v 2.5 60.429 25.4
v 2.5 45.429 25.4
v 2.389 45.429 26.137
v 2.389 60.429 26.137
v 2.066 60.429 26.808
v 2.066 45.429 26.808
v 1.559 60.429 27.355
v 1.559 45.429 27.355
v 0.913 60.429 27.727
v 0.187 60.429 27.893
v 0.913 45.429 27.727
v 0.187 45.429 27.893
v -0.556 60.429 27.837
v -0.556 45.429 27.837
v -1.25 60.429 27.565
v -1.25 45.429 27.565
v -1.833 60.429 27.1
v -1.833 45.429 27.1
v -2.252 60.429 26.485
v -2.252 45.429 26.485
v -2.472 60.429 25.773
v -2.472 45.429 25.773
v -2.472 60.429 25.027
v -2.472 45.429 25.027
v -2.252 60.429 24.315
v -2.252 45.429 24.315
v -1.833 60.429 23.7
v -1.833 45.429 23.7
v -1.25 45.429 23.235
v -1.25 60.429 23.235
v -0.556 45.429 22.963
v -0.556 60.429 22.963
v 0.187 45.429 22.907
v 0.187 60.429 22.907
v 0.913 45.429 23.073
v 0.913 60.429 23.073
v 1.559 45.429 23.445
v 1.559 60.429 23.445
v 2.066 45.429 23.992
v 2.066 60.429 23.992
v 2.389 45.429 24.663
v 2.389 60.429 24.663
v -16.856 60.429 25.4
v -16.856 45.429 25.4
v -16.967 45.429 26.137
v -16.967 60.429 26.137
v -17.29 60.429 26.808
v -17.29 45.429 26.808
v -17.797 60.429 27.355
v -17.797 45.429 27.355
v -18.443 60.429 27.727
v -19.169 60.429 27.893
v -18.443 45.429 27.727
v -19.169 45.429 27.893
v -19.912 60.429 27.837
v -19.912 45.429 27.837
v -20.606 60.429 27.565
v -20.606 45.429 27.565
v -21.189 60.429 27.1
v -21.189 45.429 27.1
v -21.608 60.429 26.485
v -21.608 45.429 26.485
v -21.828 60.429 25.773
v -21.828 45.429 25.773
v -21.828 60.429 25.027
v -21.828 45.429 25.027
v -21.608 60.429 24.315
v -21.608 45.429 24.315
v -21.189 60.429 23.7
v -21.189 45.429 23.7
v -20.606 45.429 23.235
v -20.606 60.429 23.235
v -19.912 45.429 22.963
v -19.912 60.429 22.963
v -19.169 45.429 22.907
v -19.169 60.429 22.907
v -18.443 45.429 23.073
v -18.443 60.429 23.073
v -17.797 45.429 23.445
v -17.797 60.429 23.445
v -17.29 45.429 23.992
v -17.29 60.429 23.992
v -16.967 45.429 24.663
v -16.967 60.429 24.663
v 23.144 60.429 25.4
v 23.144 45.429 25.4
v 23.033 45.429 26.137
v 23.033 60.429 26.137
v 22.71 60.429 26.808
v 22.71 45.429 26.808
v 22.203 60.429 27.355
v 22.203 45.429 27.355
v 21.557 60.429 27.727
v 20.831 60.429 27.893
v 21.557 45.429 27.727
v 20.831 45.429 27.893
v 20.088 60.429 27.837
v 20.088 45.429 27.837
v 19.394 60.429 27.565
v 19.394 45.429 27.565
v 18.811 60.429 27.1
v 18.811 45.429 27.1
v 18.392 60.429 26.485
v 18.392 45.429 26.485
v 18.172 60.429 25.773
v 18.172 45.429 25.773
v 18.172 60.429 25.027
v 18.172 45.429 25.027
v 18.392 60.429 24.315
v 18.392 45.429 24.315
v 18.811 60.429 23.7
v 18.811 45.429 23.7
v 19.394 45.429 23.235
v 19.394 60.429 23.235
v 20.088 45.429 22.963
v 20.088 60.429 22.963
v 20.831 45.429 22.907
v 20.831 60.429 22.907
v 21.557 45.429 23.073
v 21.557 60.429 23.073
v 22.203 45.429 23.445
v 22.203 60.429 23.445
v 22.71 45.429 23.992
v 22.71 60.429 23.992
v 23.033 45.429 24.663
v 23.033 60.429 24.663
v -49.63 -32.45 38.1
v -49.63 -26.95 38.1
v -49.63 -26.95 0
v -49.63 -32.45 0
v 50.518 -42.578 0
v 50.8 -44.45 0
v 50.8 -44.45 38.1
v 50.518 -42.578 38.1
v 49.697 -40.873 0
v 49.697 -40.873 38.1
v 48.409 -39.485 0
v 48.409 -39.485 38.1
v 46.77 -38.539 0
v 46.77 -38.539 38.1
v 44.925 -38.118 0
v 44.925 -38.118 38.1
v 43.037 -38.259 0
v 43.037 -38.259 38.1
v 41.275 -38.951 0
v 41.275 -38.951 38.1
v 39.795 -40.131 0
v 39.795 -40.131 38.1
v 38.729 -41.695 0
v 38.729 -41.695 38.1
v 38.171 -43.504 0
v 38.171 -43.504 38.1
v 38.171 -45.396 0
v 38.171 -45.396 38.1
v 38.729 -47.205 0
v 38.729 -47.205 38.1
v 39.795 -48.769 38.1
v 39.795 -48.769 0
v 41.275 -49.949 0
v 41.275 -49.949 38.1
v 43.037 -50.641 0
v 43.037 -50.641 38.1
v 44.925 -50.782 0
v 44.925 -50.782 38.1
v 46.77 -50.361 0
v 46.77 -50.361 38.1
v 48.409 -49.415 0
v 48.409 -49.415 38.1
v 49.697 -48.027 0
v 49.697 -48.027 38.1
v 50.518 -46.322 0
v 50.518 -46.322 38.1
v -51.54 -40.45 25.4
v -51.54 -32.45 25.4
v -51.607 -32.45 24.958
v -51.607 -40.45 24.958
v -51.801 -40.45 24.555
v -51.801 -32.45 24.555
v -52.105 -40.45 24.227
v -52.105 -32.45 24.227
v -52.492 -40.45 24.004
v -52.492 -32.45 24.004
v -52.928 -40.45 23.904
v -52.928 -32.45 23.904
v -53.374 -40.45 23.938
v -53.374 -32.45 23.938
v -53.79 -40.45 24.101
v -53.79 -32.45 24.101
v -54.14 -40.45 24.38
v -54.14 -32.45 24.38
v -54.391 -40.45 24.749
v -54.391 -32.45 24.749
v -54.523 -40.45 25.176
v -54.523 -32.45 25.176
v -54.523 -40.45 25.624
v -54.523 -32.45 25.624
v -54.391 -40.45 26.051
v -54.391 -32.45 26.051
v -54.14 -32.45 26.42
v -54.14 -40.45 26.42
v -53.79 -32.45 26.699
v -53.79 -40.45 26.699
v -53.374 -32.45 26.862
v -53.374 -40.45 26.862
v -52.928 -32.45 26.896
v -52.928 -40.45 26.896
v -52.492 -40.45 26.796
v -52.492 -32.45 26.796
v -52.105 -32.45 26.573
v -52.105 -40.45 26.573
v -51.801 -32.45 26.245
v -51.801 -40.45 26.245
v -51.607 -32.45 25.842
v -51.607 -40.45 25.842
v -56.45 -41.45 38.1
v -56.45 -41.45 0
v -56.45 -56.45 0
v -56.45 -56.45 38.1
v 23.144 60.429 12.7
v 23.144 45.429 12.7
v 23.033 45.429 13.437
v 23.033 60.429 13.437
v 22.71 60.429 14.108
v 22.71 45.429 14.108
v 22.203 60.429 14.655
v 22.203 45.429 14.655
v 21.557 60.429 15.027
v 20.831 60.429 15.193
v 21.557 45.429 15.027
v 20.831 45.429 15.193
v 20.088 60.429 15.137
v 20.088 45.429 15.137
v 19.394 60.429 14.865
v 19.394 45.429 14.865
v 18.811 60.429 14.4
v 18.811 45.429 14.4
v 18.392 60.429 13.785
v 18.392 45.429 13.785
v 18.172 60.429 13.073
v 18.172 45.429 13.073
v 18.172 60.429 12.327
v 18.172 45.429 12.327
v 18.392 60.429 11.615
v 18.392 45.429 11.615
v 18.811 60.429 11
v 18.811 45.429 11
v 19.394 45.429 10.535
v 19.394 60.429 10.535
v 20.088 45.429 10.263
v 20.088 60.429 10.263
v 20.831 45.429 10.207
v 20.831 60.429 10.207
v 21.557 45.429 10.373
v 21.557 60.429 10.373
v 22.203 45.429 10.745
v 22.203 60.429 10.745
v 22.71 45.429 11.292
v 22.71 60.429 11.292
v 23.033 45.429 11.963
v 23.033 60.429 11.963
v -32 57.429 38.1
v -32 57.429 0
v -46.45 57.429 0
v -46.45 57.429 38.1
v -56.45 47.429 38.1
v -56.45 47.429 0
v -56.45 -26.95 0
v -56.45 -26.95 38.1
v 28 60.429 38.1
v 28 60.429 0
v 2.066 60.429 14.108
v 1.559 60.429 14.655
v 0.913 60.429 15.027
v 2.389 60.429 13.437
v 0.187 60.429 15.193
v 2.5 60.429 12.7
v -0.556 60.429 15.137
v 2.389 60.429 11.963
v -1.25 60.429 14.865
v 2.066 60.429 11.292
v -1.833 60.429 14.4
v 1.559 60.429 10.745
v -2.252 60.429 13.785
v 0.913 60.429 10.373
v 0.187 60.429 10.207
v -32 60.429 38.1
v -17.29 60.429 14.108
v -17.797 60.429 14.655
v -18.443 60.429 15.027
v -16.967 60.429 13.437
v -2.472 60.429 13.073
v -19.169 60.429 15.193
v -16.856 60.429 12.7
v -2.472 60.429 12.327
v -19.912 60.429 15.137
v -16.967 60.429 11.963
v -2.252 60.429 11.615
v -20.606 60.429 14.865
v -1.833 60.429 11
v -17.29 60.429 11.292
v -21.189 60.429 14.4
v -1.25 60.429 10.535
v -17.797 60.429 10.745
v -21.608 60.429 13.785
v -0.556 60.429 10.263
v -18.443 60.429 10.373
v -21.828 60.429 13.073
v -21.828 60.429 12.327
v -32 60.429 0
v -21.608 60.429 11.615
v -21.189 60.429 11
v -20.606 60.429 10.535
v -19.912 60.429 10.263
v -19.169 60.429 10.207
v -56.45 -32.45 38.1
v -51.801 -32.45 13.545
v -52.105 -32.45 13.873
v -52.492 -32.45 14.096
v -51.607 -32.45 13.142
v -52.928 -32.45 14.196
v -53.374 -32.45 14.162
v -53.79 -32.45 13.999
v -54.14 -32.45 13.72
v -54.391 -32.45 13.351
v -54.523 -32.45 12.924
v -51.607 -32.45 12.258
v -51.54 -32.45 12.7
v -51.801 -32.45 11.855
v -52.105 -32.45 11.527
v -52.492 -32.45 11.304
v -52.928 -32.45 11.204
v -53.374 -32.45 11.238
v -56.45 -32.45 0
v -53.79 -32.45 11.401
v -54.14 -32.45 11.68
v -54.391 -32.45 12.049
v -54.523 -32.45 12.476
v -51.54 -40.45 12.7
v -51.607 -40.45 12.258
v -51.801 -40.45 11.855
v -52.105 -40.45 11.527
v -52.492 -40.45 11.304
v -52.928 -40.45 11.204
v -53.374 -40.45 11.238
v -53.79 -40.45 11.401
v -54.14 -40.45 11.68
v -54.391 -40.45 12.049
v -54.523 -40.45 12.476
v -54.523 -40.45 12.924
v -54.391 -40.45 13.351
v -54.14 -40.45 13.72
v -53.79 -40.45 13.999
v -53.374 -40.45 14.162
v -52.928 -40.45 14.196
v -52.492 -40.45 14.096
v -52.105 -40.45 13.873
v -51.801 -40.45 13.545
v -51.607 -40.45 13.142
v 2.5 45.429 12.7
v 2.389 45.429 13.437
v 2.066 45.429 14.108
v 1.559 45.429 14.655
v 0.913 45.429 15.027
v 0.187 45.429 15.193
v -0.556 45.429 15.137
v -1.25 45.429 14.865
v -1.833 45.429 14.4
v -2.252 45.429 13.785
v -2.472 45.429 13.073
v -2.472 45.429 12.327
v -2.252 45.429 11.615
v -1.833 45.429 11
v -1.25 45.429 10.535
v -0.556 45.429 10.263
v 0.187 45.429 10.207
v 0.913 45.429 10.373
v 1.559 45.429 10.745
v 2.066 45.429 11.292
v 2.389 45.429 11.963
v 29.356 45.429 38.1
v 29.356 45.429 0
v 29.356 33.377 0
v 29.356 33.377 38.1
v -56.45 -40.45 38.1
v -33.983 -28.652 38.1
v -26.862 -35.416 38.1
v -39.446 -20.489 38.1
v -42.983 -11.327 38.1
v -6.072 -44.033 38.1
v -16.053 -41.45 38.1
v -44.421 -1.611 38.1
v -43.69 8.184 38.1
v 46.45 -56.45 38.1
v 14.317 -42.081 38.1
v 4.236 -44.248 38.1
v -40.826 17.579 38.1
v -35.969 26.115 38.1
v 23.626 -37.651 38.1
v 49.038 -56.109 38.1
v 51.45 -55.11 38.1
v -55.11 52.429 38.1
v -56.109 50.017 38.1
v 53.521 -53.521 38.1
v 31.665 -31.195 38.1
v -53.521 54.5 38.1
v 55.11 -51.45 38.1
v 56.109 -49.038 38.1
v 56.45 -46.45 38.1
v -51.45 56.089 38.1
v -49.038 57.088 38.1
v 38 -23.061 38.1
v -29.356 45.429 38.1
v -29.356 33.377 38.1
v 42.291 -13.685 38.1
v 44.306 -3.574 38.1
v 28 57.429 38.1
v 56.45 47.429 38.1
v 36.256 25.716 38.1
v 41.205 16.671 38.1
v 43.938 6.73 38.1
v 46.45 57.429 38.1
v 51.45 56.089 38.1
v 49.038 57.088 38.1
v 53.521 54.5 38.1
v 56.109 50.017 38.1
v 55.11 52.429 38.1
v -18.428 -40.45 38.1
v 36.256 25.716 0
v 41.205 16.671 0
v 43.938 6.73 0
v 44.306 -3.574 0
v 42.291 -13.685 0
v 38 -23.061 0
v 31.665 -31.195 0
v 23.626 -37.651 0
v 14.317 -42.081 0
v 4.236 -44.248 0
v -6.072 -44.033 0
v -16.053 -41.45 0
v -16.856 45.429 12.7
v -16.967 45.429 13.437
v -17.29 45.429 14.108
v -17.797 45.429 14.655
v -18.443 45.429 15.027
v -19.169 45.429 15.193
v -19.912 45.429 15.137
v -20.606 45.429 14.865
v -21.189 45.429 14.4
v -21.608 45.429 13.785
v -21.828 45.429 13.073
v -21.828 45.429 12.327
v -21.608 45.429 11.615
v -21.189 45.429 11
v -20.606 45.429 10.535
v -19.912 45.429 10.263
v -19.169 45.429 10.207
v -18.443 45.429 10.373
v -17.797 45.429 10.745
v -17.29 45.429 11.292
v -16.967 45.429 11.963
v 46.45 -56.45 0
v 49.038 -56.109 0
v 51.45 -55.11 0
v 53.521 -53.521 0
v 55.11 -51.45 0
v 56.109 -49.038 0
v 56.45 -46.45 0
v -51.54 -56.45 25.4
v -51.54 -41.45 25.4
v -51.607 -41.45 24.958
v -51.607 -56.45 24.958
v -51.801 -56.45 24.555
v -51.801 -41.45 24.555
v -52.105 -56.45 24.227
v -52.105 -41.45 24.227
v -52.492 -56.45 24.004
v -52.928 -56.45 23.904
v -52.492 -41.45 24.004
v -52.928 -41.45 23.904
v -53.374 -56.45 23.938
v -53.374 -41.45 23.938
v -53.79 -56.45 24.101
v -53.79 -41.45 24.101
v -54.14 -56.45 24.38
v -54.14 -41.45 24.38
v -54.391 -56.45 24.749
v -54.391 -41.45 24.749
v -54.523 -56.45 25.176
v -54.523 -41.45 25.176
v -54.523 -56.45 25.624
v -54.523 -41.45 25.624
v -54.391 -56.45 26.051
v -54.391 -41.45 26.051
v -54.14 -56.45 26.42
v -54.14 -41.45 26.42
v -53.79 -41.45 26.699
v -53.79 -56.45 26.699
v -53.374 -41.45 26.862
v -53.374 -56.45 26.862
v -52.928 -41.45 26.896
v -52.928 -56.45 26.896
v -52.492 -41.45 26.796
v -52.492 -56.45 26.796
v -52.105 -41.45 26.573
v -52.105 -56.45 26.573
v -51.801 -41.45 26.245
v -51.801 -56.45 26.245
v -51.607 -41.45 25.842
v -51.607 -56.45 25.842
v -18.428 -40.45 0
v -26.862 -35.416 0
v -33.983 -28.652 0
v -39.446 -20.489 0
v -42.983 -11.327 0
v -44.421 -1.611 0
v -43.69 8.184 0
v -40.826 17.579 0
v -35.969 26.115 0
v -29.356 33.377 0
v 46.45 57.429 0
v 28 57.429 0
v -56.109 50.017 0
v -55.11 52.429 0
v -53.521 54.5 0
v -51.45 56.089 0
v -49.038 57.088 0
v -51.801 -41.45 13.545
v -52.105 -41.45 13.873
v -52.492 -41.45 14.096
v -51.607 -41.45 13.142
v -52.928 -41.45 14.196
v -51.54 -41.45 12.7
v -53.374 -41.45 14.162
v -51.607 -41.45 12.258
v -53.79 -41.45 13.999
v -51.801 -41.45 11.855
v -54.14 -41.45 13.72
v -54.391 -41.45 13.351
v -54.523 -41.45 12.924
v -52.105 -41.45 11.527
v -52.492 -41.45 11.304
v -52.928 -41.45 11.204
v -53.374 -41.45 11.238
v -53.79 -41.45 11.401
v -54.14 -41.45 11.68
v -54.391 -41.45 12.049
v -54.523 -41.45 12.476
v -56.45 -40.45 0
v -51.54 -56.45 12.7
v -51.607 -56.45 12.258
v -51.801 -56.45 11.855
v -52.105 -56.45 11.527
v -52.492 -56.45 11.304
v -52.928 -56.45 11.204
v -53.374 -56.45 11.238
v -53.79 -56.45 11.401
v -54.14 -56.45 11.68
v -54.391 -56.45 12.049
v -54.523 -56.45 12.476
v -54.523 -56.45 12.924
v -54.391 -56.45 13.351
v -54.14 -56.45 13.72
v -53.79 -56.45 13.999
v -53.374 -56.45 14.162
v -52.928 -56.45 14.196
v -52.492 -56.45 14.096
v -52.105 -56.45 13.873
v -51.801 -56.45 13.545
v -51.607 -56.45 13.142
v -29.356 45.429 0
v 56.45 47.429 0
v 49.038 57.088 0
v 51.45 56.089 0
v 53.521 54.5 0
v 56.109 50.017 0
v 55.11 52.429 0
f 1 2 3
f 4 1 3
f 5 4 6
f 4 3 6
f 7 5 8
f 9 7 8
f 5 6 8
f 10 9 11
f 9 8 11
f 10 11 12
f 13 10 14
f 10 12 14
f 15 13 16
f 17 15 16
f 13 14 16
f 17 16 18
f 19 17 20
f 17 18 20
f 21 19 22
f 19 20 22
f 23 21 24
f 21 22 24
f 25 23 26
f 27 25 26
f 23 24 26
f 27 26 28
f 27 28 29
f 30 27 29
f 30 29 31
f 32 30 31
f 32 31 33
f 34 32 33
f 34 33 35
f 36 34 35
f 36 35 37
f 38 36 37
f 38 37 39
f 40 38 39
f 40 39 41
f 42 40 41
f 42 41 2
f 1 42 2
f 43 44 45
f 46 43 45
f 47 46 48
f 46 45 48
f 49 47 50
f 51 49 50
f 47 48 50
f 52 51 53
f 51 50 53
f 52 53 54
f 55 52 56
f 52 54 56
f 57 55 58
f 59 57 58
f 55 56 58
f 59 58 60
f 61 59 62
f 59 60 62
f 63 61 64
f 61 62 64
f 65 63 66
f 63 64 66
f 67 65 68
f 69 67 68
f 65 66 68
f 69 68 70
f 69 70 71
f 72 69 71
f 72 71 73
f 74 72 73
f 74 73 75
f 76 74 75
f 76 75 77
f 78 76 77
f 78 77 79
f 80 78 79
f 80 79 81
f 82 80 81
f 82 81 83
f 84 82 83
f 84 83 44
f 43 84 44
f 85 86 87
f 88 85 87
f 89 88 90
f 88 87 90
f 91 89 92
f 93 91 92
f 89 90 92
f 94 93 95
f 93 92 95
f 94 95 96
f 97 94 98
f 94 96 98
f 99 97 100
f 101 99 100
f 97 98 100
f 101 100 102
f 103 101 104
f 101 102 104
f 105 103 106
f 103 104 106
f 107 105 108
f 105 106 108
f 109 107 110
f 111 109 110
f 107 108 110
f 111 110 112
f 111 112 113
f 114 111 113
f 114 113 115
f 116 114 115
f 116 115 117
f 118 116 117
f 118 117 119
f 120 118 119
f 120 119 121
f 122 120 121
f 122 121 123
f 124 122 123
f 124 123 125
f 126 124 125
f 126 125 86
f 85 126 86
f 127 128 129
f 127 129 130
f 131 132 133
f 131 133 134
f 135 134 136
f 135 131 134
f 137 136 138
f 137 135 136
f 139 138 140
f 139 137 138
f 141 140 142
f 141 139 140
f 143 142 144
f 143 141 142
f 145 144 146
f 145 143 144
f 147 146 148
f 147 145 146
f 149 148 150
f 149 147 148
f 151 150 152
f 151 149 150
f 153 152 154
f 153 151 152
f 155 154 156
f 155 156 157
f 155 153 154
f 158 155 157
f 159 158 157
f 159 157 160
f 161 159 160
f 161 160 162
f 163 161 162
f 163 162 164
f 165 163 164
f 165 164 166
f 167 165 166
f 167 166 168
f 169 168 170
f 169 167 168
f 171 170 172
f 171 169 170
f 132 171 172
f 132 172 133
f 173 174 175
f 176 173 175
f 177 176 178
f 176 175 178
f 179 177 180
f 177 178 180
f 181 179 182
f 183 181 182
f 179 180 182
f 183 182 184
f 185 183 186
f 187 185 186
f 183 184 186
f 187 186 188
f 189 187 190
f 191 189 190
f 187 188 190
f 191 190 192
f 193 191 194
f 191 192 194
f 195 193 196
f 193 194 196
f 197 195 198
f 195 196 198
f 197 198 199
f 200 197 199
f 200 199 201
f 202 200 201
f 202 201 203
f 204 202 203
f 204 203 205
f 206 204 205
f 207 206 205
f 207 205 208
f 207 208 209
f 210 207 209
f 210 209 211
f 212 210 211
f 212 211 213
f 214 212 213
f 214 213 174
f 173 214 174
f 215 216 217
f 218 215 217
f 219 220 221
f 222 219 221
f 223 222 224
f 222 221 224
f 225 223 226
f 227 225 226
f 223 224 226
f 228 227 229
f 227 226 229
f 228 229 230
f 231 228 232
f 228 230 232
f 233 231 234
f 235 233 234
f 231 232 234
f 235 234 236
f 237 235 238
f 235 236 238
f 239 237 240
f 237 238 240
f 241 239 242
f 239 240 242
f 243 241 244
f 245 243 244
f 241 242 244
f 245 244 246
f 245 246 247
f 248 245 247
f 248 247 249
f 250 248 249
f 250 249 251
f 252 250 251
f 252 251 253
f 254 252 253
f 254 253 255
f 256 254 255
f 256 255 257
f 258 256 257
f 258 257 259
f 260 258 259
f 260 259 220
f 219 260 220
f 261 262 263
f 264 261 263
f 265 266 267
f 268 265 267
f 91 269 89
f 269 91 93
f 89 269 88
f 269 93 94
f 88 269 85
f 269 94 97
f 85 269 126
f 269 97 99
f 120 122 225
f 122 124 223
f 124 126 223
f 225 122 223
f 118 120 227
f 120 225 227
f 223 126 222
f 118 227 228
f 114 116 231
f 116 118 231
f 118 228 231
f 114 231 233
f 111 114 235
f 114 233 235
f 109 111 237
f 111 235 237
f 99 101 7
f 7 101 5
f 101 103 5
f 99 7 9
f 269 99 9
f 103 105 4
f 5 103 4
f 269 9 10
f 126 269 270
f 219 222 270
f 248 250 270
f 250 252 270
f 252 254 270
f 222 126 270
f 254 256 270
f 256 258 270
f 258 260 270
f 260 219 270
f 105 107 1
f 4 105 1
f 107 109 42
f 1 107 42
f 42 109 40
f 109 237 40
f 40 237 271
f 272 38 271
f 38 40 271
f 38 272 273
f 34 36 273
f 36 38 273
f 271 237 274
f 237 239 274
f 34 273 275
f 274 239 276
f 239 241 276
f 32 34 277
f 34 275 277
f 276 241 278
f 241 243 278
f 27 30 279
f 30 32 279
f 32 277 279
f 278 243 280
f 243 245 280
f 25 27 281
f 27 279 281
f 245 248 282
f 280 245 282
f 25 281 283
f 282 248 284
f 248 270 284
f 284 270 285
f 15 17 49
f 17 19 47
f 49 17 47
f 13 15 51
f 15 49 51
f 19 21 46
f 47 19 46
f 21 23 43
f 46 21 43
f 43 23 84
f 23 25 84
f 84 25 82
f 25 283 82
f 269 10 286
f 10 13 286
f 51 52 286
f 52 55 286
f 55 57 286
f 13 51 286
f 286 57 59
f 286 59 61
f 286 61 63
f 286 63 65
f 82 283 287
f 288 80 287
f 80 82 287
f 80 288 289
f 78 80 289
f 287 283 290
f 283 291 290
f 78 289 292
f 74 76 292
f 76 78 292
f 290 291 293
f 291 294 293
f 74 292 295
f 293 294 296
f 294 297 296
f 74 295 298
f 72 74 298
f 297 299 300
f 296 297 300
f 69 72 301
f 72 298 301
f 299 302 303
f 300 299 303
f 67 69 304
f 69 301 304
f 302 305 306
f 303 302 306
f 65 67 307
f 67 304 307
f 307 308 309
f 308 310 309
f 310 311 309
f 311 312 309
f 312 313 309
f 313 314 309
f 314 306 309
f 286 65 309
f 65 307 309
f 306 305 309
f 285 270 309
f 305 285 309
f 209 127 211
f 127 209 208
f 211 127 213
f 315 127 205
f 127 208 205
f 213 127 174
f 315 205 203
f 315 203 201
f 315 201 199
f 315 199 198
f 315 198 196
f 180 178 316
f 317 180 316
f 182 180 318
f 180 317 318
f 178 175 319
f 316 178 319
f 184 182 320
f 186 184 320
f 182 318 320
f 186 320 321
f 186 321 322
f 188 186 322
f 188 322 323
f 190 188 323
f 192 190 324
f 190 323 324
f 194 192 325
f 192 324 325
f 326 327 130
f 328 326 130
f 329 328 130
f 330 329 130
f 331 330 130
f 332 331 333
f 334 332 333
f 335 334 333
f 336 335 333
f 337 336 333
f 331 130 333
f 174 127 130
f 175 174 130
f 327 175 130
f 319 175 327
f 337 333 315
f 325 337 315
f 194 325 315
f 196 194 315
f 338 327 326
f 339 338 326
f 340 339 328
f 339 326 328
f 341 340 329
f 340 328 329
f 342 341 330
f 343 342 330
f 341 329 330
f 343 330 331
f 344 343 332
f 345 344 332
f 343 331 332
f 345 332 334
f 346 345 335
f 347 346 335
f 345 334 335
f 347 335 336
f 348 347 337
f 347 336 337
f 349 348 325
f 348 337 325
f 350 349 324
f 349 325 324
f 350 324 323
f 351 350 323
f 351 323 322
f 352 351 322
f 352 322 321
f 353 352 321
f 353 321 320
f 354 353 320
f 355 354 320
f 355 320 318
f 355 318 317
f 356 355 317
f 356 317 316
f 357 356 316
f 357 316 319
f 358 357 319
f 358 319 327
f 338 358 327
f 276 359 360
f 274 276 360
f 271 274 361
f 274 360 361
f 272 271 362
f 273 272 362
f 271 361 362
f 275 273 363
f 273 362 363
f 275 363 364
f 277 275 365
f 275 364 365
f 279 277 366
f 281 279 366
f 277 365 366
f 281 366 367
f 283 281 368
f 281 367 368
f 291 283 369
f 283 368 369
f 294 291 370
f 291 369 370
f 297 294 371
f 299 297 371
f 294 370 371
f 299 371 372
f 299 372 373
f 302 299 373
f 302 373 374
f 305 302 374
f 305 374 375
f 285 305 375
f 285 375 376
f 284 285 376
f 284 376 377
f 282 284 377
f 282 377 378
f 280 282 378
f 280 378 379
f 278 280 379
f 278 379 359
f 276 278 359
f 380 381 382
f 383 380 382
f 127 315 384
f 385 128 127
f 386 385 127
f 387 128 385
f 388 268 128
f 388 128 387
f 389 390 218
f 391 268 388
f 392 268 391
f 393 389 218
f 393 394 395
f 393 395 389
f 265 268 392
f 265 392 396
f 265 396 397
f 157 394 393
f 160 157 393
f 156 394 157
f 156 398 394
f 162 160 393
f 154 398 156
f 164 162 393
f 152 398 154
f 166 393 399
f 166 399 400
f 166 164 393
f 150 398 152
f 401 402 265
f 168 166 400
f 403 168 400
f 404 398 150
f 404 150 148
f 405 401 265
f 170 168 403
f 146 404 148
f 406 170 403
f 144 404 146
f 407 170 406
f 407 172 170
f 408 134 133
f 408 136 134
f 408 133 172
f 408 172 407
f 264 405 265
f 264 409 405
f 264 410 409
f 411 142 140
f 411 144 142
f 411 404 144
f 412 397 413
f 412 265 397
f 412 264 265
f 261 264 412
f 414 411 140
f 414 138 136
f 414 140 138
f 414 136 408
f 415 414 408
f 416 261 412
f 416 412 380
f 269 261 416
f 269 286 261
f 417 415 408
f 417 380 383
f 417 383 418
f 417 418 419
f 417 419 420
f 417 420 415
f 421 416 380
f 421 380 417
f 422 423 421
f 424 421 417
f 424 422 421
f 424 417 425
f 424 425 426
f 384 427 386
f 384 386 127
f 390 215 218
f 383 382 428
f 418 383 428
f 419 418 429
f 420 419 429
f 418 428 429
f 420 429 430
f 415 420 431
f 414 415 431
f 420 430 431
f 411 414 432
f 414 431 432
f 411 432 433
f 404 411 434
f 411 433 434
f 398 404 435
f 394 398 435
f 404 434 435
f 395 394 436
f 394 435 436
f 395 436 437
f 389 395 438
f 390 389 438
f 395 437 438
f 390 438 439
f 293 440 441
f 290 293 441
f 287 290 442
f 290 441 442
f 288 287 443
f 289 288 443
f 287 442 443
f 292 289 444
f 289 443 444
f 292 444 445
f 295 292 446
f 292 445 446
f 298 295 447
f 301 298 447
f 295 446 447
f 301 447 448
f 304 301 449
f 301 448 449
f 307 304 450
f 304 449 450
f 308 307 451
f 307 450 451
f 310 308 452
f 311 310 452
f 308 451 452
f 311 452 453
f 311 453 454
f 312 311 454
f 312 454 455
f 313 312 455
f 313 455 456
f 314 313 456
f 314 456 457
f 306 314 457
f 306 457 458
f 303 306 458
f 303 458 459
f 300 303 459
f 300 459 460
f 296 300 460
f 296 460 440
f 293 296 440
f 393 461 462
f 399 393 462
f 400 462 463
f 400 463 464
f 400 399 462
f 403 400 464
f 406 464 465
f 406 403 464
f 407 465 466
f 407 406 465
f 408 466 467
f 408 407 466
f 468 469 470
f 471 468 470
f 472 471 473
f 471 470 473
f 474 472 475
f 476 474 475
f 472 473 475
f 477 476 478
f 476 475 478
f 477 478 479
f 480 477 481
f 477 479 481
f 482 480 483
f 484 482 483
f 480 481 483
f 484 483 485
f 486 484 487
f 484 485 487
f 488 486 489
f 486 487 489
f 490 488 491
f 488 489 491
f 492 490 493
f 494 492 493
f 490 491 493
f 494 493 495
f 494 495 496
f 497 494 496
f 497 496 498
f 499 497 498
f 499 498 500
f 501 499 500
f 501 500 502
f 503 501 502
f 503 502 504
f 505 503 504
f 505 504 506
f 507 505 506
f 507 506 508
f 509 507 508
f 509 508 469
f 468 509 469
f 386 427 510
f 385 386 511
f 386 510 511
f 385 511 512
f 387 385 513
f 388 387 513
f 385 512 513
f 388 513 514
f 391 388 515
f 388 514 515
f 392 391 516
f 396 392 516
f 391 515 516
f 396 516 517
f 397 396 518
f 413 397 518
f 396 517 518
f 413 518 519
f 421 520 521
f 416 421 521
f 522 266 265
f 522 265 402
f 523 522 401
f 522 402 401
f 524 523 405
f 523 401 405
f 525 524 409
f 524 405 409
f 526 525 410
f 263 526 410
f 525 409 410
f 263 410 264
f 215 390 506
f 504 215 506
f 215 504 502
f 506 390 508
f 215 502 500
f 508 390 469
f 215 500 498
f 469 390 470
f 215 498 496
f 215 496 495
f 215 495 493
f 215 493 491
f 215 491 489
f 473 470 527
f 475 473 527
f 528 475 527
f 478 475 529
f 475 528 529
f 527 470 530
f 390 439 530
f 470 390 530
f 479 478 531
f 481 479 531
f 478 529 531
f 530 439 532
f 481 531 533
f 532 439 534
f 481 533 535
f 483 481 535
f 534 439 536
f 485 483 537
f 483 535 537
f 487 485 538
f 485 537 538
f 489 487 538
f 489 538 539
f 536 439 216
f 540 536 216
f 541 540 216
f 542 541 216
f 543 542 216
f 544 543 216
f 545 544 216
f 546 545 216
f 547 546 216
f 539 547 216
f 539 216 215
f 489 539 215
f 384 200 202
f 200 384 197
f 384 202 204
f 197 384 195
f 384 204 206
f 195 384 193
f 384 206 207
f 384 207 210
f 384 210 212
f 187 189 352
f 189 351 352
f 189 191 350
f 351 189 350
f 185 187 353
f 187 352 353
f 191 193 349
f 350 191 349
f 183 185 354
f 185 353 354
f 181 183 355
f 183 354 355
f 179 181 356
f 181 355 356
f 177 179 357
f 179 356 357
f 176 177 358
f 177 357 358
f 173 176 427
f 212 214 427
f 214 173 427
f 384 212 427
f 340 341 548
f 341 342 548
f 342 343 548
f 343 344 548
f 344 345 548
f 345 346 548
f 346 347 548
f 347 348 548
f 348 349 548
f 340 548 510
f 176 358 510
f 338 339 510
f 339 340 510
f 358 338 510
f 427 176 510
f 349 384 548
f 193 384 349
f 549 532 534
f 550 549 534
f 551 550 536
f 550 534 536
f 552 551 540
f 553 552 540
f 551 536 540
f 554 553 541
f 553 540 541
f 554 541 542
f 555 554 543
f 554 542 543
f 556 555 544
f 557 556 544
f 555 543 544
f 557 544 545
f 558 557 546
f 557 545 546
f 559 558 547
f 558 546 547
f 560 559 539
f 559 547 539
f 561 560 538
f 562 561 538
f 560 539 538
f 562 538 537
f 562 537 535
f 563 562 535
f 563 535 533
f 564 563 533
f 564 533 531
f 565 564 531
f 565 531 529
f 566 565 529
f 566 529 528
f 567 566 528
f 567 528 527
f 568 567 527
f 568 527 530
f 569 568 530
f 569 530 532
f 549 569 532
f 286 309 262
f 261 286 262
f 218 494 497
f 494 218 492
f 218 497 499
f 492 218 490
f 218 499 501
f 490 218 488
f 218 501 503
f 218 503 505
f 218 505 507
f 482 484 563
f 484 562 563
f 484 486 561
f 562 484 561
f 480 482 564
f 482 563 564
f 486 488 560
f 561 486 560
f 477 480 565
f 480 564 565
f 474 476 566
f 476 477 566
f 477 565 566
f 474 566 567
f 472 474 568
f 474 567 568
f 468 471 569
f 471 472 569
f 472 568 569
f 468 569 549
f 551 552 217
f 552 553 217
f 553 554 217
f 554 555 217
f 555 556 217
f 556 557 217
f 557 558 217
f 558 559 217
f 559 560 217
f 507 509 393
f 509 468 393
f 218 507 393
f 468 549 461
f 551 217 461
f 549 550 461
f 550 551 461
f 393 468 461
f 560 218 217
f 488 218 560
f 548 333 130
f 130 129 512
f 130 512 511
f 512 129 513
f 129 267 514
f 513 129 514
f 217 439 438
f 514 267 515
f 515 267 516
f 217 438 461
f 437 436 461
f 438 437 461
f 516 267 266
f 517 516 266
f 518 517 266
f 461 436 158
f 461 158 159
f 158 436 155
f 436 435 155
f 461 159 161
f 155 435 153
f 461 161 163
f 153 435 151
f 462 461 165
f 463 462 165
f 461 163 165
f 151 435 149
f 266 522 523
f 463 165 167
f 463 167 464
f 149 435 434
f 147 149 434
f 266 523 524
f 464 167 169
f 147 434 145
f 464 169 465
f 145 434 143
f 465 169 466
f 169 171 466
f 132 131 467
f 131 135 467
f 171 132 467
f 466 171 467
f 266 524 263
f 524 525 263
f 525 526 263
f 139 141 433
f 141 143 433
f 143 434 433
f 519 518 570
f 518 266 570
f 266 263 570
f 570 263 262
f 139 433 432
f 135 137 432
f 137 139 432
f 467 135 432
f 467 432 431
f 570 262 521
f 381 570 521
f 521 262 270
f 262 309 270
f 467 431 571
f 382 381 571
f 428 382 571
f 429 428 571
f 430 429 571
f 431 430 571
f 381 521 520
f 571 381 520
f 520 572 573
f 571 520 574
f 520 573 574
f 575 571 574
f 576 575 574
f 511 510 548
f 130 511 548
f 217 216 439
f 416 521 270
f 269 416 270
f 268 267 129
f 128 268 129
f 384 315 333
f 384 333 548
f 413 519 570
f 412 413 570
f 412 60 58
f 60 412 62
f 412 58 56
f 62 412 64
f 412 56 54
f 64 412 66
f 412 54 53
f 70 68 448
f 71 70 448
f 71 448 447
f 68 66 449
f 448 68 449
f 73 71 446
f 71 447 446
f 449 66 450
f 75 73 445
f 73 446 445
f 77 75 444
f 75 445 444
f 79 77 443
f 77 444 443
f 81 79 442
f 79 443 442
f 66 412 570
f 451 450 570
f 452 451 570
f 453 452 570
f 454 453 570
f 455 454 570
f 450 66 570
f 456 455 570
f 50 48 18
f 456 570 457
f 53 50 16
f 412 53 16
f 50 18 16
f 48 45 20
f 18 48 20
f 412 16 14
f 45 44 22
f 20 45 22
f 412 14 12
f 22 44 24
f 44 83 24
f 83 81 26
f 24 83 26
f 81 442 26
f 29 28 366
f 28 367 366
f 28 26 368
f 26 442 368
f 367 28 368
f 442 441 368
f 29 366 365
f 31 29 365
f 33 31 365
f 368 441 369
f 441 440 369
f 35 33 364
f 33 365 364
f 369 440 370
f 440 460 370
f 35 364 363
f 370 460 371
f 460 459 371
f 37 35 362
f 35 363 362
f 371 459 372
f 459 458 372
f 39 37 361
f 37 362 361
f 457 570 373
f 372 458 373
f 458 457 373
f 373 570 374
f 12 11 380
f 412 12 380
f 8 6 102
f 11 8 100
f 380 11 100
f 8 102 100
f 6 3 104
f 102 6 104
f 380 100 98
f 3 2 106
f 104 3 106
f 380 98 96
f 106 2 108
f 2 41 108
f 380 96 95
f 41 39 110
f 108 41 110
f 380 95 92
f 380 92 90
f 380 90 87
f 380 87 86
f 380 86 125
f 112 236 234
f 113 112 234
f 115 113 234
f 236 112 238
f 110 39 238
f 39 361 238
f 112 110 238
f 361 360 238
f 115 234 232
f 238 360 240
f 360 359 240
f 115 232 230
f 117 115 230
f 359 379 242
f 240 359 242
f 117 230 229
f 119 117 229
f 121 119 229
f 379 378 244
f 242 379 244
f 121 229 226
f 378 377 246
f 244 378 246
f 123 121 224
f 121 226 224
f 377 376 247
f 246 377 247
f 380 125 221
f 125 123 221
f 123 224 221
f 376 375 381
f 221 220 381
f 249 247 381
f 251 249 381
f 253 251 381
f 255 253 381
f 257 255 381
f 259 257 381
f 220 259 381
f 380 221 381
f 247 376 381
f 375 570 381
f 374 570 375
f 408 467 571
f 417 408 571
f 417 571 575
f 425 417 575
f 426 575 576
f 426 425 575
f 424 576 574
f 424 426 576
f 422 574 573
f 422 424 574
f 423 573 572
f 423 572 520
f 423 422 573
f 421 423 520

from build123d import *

# Parameters (mm, degrees)
F0_R     = 6.35
F1_DEPTH = 38.1
F3_D     = 5
F3_DEPTH = 15.001
F5_D     = 3
F5_DEPTH = 29.501
F6_R     = 10


with BuildPart() as f1:
    # F0 (on Top) → F1 (new body)
    with BuildSketch(Plane.XY):
        with BuildLine():
            ThreePointArc((-18.4282391997, -40.45), (-43.9709210804, -6.508502081), (-29.3559965753, 33.3770574658))
            Line((-29.3559965753, 33.3770574658), (-29.3559965753, 45.4292414335))
            Line((-29.3559965753, 45.4292414335), (29.3559965753, 45.4292414335))
            Line((29.3559965753, 45.4292414335), (29.3559965753, 33.3770574658))
            ThreePointArc((29.3559965753, 33.3770574658), (38.0001883545, -23.0605330603), (-16.0530370958, -41.45))
            Line((-16.0530370958, -41.45), (-56.45, -41.45))
            Line((-56.45, -41.45), (-56.45, -56.45))
            Line((-56.45, -56.45), (56.45, -56.45))
            Line((56.45, -56.45), (56.45, 57.4292414335))
            Line((56.45, 57.4292414335), (28, 57.4292414335))
            Line((28, 57.4292414335), (28, 60.4292414335))
            Line((28, 60.4292414335), (-32, 60.4292414335))
            Line((-32, 60.4292414335), (-32, 57.4292414335))
            Line((-32, 57.4292414335), (-56.45, 57.4292414335))
            Line((-56.45, 57.4292414335), (-56.45, -26.95))
            Line((-56.45, -26.95), (-49.6300168369, -26.95))
            Line((-49.6300168369, -26.95), (-49.6300168369, -32.45))
            Line((-49.6300168369, -32.45), (-56.45, -32.45))
            Line((-56.45, -32.45), (-56.45, -40.45))
            Line((-56.45, -40.45), (-18.4282391997, -40.45))
        make_face()
        with Locations((44.45, -44.45)):
            Circle(F0_R, mode=Mode.SUBTRACT)
    extrude(amount=F1_DEPTH)

    # F3 (through all, one way)
    with BuildSketch(Plane.XZ.offset(-45.4292414335)):
        with Locations((-19.3559965753, 25.4), (-19.3559965753, 12.7), (20.6440034247, 25.4), (20.6440034247, 12.7), (0, 25.4), (0, 12.7)):
            Circle(F3_D / 2)
    extrude(amount=-F3_DEPTH, mode=Mode.SUBTRACT)

    # F5 (through all, one way)
    with BuildSketch(Plane(origin=(0, -26.95, 0), x_dir=(1, 0, 0), z_dir=(0, 1, 0))):
        with Locations((-53.0400084184, -25.4), (-53.0400084184, -12.7)):
            Circle(F5_D / 2)
    extrude(amount=-F5_DEPTH, mode=Mode.SUBTRACT)

    # F6
    f6_edges = [f1.edges().sort_by_distance(p)[0] for p in [
        (56.45, 57.429241, 19.05),
        (-56.45, 57.429241, 19.05),
        (56.45, -56.45, 19.05),
    ]]
    fillet(f6_edges, radius=F6_R)


solid = f1.part
